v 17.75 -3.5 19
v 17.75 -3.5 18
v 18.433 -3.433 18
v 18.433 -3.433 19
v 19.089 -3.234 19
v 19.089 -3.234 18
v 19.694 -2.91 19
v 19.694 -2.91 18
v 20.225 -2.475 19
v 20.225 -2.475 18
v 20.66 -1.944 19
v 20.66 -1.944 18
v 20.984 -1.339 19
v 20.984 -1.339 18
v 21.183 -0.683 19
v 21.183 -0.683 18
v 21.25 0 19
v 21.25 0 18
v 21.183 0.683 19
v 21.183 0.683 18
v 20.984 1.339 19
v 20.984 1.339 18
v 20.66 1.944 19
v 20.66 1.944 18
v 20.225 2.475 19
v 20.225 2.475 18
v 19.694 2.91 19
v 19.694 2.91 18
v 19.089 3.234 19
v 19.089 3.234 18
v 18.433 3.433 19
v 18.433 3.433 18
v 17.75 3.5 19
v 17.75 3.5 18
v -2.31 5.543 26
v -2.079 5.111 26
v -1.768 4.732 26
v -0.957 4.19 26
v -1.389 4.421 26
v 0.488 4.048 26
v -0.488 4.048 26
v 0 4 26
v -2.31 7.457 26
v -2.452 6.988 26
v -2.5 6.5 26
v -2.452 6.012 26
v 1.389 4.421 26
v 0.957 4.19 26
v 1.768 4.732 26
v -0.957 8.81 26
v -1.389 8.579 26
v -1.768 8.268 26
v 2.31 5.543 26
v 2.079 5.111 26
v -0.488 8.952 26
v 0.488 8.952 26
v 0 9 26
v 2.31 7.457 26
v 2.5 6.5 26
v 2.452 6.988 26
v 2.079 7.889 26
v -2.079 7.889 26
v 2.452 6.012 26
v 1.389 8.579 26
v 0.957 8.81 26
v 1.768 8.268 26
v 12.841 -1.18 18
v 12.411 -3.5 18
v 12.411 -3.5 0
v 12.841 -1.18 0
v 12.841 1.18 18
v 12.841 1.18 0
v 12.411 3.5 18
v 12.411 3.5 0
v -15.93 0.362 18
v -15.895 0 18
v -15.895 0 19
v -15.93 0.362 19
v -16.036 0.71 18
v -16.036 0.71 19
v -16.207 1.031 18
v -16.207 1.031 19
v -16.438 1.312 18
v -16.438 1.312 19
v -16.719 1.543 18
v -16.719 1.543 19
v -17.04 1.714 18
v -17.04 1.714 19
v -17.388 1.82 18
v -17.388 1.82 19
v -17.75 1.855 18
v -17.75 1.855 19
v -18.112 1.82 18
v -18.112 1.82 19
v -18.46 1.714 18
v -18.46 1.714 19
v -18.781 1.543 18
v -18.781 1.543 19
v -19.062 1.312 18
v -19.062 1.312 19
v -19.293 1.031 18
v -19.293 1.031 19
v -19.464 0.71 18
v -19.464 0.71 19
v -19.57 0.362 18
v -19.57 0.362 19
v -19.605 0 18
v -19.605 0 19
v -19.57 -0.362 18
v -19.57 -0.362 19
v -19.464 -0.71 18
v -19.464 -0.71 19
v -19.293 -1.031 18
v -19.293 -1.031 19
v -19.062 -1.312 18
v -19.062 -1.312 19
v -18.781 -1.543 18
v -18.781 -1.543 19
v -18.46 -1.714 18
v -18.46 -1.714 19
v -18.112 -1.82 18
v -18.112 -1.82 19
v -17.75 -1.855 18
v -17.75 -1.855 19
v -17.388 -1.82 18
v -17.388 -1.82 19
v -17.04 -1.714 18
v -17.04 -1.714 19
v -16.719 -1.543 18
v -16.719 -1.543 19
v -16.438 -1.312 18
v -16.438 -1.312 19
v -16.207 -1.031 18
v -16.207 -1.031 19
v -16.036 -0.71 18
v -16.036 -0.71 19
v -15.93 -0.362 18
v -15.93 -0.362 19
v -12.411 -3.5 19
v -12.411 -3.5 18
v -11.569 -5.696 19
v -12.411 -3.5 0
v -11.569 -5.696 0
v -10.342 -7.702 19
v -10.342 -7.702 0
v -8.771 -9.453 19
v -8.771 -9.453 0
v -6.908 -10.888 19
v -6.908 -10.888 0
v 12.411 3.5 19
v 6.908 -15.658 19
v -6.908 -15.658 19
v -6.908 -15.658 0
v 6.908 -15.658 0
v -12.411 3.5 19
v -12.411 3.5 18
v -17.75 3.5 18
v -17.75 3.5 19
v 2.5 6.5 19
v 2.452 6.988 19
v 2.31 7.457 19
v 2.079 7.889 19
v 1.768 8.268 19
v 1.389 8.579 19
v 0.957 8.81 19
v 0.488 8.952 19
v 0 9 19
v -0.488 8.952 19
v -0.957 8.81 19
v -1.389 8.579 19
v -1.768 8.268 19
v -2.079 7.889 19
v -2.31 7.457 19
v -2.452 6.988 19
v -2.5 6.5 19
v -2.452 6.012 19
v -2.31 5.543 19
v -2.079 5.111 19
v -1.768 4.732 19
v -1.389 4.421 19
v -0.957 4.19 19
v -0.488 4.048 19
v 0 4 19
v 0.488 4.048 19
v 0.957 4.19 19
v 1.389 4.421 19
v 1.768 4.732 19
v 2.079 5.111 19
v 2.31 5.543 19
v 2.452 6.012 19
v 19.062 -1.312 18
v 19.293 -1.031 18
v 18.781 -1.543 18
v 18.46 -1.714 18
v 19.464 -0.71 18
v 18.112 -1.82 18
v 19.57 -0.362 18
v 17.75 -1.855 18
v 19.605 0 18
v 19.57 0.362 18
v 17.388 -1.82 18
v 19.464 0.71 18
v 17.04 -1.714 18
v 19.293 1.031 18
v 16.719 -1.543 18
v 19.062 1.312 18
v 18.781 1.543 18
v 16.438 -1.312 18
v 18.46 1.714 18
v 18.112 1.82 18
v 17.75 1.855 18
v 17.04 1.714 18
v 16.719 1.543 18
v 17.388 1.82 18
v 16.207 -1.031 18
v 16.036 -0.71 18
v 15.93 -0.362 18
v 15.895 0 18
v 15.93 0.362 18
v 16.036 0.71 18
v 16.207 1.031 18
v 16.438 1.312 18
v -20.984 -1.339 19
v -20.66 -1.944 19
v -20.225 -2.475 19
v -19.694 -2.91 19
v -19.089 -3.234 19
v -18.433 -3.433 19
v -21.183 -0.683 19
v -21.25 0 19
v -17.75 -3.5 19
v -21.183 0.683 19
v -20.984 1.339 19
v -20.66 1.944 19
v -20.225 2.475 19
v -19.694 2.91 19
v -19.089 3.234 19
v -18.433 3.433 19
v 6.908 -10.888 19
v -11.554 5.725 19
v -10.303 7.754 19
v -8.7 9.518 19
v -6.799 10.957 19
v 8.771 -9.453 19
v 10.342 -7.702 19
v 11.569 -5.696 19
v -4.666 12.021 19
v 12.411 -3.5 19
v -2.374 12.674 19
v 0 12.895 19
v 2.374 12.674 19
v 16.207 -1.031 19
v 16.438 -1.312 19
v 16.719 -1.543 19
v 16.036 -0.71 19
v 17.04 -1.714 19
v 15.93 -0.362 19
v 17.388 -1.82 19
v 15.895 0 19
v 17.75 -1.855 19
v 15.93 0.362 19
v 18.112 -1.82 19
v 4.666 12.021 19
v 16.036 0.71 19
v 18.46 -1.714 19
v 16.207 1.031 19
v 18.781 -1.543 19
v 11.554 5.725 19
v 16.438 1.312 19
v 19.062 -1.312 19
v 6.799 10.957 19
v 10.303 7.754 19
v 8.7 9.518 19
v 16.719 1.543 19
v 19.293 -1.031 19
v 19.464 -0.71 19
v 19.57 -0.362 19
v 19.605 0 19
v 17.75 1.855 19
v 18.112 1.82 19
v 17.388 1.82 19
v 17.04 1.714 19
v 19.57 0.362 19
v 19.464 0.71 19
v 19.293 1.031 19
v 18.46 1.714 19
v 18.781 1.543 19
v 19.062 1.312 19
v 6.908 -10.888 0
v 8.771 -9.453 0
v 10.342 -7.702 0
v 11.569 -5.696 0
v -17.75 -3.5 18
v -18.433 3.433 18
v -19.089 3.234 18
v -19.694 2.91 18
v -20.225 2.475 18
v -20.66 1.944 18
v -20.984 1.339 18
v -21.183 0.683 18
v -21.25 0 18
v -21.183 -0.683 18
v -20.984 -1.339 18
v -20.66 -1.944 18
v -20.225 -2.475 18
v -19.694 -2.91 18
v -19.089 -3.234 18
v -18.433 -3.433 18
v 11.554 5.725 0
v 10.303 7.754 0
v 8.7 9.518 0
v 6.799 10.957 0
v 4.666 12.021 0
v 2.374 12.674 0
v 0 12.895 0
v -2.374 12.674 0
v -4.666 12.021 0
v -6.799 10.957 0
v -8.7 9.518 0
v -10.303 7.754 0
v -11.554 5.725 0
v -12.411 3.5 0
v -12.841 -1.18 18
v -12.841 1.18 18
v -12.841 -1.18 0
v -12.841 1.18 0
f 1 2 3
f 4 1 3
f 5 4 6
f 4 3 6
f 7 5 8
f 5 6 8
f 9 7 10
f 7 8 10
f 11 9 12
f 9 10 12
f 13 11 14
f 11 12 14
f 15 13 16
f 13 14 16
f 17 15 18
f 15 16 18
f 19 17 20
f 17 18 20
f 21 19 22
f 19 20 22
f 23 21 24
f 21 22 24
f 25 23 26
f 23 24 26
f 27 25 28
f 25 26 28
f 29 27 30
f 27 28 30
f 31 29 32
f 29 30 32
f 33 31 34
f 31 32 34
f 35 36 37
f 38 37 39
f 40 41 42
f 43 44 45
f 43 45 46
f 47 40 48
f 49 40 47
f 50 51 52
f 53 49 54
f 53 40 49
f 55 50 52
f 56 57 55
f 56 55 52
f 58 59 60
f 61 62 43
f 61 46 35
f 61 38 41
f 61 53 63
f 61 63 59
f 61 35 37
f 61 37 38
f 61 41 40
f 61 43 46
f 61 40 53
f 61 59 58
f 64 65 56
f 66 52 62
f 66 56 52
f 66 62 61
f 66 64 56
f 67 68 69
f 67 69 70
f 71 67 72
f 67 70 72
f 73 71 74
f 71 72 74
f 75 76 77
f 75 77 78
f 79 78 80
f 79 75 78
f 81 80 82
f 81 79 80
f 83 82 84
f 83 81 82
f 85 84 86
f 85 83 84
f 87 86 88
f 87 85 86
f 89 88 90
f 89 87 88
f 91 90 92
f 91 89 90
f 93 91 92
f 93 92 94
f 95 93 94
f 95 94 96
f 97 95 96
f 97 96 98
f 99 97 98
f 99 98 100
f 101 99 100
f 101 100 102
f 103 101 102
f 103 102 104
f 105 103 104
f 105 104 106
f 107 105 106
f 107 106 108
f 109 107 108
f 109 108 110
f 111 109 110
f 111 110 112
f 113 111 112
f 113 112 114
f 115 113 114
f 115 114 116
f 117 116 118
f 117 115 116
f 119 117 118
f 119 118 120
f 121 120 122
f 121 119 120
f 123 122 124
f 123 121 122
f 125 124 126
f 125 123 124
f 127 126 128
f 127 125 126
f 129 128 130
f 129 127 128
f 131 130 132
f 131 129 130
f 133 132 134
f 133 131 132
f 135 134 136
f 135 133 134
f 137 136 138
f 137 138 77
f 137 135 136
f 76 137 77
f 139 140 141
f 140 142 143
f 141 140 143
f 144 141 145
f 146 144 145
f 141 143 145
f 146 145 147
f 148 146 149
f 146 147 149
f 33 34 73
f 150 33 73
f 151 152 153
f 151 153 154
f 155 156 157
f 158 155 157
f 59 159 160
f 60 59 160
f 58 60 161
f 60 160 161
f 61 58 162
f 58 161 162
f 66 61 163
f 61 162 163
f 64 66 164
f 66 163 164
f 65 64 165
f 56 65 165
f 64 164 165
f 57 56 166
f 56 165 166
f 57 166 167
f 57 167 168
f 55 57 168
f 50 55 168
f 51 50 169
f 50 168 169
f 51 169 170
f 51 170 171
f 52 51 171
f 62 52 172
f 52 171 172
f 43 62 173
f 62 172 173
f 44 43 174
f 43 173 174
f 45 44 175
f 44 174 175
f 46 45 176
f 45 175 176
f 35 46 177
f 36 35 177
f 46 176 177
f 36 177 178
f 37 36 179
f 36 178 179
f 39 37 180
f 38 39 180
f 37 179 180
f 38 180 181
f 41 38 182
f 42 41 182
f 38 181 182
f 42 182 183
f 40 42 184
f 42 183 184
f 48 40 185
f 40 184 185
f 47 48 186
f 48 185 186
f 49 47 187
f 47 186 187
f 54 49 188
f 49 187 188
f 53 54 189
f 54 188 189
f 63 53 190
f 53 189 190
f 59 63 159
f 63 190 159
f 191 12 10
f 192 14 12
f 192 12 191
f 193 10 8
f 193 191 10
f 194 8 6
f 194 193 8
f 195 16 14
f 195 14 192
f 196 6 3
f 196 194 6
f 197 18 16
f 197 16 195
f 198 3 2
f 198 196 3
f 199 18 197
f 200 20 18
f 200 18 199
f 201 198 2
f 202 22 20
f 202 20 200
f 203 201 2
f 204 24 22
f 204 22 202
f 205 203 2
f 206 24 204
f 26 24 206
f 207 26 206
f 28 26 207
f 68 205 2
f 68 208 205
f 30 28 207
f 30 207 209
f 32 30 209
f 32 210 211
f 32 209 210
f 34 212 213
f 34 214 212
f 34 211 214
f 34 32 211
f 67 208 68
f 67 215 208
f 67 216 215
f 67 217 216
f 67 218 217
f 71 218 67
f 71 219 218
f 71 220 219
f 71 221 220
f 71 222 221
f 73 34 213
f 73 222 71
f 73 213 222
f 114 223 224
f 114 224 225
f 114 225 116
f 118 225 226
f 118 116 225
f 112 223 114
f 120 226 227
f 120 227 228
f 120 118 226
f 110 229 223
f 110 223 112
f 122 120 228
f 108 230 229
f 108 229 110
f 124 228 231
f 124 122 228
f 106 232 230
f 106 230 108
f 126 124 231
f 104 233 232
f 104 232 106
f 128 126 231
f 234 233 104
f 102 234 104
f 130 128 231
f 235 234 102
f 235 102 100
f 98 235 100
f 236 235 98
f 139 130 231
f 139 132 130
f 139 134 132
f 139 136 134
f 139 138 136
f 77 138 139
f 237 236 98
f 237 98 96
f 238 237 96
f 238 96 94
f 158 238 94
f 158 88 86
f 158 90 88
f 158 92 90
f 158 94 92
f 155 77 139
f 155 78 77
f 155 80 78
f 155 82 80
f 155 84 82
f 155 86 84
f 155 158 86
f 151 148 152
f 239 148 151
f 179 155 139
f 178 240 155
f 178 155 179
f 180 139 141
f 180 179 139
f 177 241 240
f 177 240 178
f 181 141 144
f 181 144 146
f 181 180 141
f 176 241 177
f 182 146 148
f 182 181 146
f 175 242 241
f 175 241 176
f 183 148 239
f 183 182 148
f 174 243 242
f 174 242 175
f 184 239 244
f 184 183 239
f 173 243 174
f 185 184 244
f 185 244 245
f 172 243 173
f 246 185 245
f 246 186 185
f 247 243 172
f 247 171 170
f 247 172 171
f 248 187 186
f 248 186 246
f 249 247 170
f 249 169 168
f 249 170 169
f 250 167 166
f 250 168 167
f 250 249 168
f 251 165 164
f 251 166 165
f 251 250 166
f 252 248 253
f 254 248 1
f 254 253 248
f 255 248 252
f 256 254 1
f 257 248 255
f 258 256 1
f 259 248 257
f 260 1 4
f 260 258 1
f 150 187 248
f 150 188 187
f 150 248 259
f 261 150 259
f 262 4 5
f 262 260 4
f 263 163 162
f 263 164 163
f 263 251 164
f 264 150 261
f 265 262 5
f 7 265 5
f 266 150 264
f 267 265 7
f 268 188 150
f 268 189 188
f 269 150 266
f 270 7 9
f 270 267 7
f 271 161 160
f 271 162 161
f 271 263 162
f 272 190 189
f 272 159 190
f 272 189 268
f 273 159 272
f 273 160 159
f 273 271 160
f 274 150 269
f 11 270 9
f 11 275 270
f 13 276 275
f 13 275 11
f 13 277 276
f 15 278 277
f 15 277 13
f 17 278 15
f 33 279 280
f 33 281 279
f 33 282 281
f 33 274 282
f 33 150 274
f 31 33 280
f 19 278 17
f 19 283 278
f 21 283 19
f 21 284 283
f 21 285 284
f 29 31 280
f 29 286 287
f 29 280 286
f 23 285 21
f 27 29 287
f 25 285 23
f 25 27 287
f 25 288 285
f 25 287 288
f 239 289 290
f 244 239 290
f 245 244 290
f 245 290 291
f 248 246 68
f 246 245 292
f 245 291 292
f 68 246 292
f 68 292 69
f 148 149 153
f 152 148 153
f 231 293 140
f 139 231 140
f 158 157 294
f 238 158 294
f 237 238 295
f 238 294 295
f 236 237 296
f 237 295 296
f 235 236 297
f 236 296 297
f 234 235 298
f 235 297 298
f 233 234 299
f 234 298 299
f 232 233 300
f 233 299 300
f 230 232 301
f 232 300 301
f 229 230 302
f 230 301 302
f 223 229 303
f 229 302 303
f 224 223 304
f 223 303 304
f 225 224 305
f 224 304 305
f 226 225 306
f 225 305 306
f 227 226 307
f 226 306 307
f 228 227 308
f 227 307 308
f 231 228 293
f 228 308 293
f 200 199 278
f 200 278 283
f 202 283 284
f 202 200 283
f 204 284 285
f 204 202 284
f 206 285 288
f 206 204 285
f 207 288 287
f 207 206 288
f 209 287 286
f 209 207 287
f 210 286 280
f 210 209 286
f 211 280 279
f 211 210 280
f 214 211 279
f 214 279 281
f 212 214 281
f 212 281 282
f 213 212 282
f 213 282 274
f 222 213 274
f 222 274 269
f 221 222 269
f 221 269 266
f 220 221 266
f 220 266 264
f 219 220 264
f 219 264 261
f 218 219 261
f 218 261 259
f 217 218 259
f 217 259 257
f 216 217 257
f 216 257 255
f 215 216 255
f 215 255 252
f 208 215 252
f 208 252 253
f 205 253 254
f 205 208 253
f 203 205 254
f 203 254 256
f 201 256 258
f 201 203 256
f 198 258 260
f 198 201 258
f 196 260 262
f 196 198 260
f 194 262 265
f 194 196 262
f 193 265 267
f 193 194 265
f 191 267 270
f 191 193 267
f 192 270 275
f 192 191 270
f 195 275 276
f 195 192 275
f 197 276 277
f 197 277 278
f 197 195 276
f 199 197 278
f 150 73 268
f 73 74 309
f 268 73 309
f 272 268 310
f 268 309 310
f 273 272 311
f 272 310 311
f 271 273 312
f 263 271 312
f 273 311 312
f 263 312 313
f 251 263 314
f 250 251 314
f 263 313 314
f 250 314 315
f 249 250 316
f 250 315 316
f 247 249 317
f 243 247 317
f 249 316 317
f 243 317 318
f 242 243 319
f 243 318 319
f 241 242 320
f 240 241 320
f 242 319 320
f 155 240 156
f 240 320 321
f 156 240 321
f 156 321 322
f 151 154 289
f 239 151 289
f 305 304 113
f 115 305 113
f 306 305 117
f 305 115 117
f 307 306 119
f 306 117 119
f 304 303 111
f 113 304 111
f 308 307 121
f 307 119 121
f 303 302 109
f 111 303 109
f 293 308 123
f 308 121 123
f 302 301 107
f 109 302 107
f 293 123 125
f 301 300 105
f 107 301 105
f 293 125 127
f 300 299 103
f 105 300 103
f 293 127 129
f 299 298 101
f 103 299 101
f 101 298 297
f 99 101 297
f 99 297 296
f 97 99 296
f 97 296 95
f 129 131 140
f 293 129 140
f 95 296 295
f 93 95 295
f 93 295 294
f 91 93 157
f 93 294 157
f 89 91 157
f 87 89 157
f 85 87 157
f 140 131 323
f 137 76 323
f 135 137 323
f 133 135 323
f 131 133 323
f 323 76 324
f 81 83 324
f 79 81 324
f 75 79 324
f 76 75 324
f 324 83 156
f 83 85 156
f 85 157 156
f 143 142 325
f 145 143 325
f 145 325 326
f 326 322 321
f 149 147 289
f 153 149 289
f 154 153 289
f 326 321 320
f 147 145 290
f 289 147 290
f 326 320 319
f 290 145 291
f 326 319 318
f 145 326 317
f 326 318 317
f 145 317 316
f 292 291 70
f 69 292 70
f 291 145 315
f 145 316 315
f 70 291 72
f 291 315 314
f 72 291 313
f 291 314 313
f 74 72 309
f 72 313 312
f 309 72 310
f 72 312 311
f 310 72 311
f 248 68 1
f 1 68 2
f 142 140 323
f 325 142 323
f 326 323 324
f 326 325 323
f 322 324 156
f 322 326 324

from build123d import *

# Parameters (mm, degrees)
ESBO_O1_R                = 1.85525586
RESSALTO_EXTRUS_O1_DEPTH = 19
CORTE_EXTRUS_O1_DEPTH    = 18
ESBO_O3_R                = 2.5
RESSALTO_EXTRUS_O2_DEPTH = 7


with BuildPart() as part:
    # Esboço1 → Ressalto-extrusão1 (new body)
    with BuildSketch(Plane.XY):
        with BuildLine():
            Line((17.75, 3.5), (12.410650194, 3.5))
            ThreePointArc((12.410650194, 3.5), (0, 12.894736842), (-12.410650194, 3.5))
            Line((-12.410650194, 3.5), (-17.75, 3.5))
            ThreePointArc((-17.75, 3.5), (-21.25, 0), (-17.75, -3.5))
            Line((-17.75, -3.5), (-12.410650194, -3.5))
            ThreePointArc((-12.410650194, -3.5), (-10.341581818, -7.702332356), (-6.907894737, -10.888306964))
            Line((-6.907894737, -10.888306964), (-6.907894737, -12.894736842))
            Line((-6.907894737, -12.894736842), (-6.907894737, -15.657894737))
            Line((-6.907894737, -15.657894737), (6.907894737, -15.657894737))
            Line((6.907894737, -15.657894737), (6.907894737, -12.894736842))
            Line((6.907894737, -12.894736842), (6.907894737, -10.888306964))
            ThreePointArc((6.907894737, -10.888306964), (10.341581818, -7.702332356), (12.410650194, -3.5))
            Line((12.410650194, -3.5), (17.75, -3.5))
            ThreePointArc((17.75, -3.5), (21.25, 0), (17.75, 3.5))
        make_face()
        with Locations((17.75, 0)):
            Circle(ESBO_O1_R, mode=Mode.SUBTRACT)
        with Locations((-17.75, 0)):
            Circle(ESBO_O1_R, mode=Mode.SUBTRACT)
    extrude(amount=RESSALTO_EXTRUS_O1_DEPTH)

    # Esboço2 → Corte-extrusão1 (cut)
    with BuildSketch(Plane(origin=(0, 0, 0), x_dir=(-1, 0, 0), z_dir=(0, 0, -1))):
        with BuildLine():
            Line((12.410650194, 3.5), (23.80699558, 3.5))
            Line((23.80699558, 3.5), (23.80699558, -3.5))
            Line((23.80699558, -3.5), (12.410650194, -3.5))
            ThreePointArc((12.410650194, -3.5), (12.894736842, 0), (12.410650194, 3.5))
        make_face()
        with BuildLine():
            Line((-12.410650194, 3.5), (-24.760546325, 3.5))
            Line((-24.760546325, 3.5), (-24.760546325, -3.5))
            Line((-24.760546325, -3.5), (-12.410650194, -3.5))
            ThreePointArc((-12.410650194, -3.5), (-12.894736842, 0), (-12.410650194, 3.5))
        make_face()
    extrude(amount=-CORTE_EXTRUS_O1_DEPTH, mode=Mode.SUBTRACT)

    # Esboço3 → Ressalto-extrusão2 (add)
    with BuildSketch(Plane.XY.offset(19)):
        with Locations((0, 6.5)):
            Circle(ESBO_O3_R)
    extrude(amount=RESSALTO_EXTRUS_O2_DEPTH)


solid = part.part
